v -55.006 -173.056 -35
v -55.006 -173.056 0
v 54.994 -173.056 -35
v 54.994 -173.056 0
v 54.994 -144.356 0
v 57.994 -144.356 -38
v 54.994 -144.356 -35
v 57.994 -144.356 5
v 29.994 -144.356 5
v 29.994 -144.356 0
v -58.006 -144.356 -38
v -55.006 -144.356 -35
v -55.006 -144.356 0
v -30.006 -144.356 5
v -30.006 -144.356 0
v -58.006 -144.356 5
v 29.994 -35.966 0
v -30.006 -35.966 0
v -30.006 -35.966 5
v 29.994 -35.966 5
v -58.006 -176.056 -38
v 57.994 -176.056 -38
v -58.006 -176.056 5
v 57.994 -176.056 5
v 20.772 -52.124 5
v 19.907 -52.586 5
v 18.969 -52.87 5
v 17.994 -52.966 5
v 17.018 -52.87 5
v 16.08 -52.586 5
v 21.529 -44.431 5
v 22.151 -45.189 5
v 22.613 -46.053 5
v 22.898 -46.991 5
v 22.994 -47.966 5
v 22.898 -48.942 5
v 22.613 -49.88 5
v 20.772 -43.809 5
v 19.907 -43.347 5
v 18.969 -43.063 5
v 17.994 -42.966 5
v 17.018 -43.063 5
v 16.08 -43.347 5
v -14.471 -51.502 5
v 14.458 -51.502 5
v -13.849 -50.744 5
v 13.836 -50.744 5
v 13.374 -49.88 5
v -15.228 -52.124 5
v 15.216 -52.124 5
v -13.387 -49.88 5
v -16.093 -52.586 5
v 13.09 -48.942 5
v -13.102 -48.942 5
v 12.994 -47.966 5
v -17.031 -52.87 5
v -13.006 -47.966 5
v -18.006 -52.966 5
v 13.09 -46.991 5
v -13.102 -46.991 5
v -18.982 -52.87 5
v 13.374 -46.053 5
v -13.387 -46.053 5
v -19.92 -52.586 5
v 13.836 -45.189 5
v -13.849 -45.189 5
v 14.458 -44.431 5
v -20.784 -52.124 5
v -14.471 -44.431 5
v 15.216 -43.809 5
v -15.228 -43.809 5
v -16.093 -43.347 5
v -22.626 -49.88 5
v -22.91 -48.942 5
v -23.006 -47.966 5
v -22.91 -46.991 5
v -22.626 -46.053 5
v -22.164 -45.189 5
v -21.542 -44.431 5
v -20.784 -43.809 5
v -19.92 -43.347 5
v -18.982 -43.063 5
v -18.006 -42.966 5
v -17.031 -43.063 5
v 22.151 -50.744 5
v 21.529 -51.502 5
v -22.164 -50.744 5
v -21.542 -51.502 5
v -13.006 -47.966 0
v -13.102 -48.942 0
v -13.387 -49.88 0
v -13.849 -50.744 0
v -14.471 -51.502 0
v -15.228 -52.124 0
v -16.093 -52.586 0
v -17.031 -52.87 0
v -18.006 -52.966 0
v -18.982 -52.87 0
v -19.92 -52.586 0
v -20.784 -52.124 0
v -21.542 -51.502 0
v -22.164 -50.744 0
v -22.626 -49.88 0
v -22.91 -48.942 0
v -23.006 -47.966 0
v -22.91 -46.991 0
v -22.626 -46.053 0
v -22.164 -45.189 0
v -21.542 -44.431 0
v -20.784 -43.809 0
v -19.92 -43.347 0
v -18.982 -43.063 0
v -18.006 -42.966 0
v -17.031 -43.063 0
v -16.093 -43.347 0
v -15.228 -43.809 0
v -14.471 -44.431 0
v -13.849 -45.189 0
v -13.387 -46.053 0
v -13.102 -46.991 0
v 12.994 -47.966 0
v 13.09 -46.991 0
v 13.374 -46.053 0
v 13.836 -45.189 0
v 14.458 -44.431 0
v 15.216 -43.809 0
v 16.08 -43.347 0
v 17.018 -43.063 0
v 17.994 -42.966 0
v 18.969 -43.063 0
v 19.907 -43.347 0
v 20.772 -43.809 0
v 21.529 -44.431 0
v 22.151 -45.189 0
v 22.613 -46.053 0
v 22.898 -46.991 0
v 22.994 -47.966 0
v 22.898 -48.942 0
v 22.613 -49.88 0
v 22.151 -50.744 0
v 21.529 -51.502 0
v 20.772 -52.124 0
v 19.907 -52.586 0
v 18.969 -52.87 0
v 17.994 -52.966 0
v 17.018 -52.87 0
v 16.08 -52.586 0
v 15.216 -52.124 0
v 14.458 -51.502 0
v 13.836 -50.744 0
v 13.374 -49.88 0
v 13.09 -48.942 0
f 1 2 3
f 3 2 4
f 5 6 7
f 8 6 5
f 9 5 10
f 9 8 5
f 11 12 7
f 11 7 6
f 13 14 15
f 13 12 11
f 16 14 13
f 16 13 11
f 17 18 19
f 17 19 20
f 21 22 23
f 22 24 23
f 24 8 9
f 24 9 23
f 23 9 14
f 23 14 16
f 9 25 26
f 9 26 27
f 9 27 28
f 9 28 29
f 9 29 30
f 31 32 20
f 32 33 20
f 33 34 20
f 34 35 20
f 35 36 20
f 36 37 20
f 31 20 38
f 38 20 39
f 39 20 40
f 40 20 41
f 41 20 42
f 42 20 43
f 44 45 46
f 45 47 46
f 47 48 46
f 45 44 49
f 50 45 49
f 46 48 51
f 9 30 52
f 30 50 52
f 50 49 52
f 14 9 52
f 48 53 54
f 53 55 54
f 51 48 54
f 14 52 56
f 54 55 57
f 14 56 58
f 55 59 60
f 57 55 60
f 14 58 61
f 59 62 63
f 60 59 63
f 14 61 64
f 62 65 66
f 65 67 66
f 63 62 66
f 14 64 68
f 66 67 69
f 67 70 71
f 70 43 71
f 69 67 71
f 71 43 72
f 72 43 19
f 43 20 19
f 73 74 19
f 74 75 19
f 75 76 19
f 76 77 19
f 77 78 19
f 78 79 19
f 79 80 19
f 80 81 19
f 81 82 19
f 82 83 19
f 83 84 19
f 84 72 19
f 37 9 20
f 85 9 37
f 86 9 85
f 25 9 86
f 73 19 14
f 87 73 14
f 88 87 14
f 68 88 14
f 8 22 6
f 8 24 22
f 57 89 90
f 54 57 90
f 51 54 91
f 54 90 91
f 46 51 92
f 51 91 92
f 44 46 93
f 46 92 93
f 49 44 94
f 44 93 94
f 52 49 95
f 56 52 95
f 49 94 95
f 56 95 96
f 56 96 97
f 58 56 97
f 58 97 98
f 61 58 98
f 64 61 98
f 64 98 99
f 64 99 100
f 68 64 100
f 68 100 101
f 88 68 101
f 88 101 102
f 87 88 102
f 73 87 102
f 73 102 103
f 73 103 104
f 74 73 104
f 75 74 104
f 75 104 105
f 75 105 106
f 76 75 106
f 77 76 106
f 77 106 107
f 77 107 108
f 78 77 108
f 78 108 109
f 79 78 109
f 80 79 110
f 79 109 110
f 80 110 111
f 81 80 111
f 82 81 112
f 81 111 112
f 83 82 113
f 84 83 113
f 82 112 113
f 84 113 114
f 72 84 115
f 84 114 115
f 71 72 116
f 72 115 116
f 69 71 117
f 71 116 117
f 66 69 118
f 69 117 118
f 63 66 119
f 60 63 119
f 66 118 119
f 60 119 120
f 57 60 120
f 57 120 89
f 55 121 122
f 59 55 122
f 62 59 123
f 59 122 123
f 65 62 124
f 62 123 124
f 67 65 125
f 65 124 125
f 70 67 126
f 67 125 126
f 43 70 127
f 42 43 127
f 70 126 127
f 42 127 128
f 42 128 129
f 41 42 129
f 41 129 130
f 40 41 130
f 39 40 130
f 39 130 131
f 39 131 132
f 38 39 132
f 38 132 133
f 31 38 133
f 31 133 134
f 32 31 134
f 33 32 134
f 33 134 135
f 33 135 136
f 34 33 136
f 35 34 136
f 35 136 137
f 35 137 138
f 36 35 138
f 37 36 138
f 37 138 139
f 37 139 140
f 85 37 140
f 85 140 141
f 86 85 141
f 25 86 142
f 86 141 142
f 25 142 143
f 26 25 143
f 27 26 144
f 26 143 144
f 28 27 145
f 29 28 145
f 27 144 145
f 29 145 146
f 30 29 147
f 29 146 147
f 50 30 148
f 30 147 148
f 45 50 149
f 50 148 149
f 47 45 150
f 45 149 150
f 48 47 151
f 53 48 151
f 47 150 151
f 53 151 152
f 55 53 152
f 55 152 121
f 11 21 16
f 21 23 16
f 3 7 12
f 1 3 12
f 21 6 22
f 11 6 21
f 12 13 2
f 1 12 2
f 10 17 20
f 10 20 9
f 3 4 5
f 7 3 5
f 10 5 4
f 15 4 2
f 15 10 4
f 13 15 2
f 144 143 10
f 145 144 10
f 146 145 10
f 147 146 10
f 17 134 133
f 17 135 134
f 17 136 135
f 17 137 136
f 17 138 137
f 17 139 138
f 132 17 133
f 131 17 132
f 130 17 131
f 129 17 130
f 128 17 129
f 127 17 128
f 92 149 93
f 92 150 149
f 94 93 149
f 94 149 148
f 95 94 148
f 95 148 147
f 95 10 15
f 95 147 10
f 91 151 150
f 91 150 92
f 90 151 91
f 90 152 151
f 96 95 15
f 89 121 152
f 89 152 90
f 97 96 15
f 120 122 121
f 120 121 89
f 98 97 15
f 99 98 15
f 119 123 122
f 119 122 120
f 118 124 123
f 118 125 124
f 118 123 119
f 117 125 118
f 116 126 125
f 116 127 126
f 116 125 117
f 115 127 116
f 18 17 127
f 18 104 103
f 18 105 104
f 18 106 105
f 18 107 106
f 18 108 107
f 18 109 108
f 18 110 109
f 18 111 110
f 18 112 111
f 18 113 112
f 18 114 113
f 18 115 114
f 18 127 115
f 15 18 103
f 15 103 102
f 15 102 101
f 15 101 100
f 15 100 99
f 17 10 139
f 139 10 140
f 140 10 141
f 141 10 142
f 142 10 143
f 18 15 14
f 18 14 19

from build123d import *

# Parameters (mm, degrees)
EXTRUDE_1_DEPTH     = 5
EXTRUDE_2_DEPTH     = 35
SKETCH_4_W          = 116
SKETCH_4_H          = 31.7
EXTRUDE_3_DEPTH     = 3
SKETCH_6_R          = 5
CUT_EXTRUDE_1_DEPTH = 190.221017262


with BuildPart() as part:
    # 草图2 → 凸台-拉伸1 (new body)
    with BuildSketch(Plane.XY):
        Polygon((-30.006166306, -35.96646266), (29.993833694, -35.96646266), (29.993833694, -144.35646266), (57.993833694, -144.35646266), (57.993833694, -176.05646266), (-58.006166306, -176.05646266), (-58.006166306, -144.35646266), (-30.006166306, -144.35646266), align=None)
    extrude(amount=EXTRUDE_1_DEPTH)

    # 草图3 → 凸台-拉伸2 (add)
    with BuildSketch(Plane(origin=(0, 0, 0), x_dir=(-1, 0, 0), z_dir=(0, 0, -1))):
        Polygon((-57.993833694, -144.35646266), (-57.993833694, -176.05646266), (58.006166306, -176.05646266), (58.006166306, -144.35646266), (55.006166306, -144.35646266), (55.006166306, -173.05646266), (-54.993833694, -173.05646266), (-54.993833694, -144.35646266), align=None)
    extrude(amount=EXTRUDE_2_DEPTH)

    # 草图4 → 凸台-拉伸3 (add)
    with BuildSketch(Plane(origin=(0, 0, -35), x_dir=(-1, 0, 0), z_dir=(0, 0, -1))):
        with Locations((0.006166306, -160.20646266)):
            Rectangle(SKETCH_4_W, SKETCH_4_H)
    extrude(amount=EXTRUDE_3_DEPTH)

    # 草图6 → 切除-拉伸1 (cut, through all)
    with BuildSketch(Plane(origin=(0, 0, 0), x_dir=(-1, 0, 0), z_dir=(0, 0, -1))):
        with Locations((-17.993833694, -47.96646266)):
            Circle(SKETCH_6_R)
        with Locations(Location((18.006166306, -47.96646266, 0), (0, 0, 180))):
            Circle(SKETCH_6_R)
    extrude(amount=-CUT_EXTRUDE_1_DEPTH, mode=Mode.SUBTRACT)


solid = part.part
